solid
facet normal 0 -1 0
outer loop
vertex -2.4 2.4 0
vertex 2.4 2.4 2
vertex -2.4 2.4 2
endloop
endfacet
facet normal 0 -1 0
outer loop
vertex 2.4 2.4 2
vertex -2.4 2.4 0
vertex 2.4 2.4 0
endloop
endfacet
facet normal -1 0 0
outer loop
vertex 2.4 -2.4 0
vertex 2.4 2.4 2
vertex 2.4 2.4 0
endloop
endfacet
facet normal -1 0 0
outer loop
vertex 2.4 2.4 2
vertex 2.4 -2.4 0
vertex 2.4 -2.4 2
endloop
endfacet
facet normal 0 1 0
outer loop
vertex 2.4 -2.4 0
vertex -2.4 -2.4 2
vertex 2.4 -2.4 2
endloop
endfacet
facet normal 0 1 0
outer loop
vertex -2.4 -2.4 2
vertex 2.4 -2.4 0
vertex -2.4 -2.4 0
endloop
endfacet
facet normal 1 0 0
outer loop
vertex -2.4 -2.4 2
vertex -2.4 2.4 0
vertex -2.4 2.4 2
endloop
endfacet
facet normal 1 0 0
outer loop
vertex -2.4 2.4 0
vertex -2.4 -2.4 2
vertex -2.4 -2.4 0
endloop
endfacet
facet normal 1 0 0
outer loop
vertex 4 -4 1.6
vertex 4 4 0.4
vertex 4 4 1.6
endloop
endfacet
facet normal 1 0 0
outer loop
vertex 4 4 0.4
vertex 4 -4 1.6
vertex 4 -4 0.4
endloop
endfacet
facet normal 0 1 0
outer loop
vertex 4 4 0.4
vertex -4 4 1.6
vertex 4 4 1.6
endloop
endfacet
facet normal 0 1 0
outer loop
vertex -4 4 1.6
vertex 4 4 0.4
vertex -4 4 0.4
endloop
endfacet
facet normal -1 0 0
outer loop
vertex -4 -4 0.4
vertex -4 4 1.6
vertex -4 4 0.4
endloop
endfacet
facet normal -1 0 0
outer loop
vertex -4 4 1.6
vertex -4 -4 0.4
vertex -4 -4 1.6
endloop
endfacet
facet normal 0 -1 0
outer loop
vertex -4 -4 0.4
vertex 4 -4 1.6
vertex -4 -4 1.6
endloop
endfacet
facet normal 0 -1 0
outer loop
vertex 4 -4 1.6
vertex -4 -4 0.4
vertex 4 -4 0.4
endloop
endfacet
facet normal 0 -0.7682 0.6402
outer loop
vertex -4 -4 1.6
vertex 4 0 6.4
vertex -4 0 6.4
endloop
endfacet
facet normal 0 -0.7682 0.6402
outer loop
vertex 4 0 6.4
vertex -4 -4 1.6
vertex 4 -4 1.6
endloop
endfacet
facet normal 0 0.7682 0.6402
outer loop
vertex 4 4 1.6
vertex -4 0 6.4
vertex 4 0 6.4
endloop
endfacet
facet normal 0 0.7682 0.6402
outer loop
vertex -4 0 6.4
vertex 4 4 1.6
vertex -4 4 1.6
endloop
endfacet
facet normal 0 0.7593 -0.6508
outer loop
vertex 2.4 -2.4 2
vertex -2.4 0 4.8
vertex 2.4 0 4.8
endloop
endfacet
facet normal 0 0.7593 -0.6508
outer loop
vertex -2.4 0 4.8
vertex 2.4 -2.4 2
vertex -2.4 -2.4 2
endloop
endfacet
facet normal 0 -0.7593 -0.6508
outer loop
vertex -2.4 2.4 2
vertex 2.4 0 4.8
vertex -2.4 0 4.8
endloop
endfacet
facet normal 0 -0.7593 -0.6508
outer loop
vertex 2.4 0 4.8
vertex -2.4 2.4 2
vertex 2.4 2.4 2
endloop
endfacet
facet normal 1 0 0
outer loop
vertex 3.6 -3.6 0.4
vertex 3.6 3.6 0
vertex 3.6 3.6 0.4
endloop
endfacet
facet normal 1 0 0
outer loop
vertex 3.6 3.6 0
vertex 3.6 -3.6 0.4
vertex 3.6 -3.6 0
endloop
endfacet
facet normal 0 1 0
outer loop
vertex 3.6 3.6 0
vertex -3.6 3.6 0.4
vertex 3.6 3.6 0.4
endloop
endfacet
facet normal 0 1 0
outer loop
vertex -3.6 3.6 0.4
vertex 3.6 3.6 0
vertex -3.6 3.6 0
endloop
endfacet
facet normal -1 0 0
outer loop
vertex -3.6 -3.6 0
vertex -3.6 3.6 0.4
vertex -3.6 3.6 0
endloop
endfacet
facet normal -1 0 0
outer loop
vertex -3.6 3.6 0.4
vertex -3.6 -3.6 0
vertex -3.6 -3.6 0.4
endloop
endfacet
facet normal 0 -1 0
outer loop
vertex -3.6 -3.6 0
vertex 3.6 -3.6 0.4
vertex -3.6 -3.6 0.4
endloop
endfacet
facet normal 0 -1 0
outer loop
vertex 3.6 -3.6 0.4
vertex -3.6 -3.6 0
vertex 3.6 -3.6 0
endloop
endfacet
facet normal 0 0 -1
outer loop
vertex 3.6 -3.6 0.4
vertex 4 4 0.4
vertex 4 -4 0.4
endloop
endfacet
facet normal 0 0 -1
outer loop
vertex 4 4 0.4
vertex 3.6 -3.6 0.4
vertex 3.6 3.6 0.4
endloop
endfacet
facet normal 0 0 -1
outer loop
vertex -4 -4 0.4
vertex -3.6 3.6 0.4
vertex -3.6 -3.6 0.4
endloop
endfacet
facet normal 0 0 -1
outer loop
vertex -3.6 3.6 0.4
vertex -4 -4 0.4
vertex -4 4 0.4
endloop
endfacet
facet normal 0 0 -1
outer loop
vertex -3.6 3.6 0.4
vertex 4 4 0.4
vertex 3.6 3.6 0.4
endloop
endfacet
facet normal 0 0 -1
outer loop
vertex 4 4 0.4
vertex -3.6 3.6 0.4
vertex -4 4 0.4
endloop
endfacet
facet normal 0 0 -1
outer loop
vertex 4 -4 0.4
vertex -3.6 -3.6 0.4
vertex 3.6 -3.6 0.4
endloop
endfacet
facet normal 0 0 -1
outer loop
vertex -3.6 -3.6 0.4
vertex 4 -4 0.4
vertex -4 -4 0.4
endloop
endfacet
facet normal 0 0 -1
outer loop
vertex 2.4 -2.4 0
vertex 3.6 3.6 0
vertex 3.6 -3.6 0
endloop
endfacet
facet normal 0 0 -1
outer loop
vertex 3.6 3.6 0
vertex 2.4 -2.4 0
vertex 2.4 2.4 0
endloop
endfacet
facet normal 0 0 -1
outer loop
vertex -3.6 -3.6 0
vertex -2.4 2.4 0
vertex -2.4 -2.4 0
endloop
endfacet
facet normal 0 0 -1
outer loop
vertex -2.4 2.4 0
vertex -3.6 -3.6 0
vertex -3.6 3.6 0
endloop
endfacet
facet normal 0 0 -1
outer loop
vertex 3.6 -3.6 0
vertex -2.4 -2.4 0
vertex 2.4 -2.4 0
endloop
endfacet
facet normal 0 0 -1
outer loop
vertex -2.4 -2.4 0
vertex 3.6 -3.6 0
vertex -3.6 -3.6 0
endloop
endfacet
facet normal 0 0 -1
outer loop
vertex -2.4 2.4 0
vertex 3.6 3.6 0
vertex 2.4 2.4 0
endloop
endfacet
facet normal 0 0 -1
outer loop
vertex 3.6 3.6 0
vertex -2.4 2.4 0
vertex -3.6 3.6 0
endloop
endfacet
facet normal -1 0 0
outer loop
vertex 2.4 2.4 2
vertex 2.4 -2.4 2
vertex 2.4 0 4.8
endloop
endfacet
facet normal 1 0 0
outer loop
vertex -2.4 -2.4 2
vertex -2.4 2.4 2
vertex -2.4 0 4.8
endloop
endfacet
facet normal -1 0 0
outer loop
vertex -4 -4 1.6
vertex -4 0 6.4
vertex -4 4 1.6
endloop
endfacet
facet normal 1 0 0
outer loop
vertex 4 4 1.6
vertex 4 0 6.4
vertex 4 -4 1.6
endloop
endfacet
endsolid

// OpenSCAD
// file: ../p/stud23d.scad
use <../lib.scad>
use <box4o4a.scad>
function ldraw_lib__stud23d() = [
// 0 Stud Tube Open Square without Bottom Face and Edges
// 0 Name: stud23d.dat
// 0 Author: Steffen [Steffen]
// 0 !LDRAW_ORG Primitive UPDATE 2018-02
// 0 !LICENSE Licensed under CC BY 4.0 : see CAreadme.txt
// 
// 0 BFC CERTIFY CCW
  [0,"BFC","CERTIFY"],
  [0,"BFC","CCW"],
// 
// 0 !HISTORY 2018-12-08 [PTadmin] Official Update 2018-02
// 
// 
// 0 BFC INVERTNEXT
  [0,"BFC","INVERTNEXT"],
// 1 16 0 0 0 6 0 0 0 4 0 0 0 6 box4o4a.dat
  [1,16,0,0,0,6,0,0,0,4,0,0,0,6, ldraw_lib__box4o4a()],
];
module ldraw_lib__stud23d(step=0, col=false, unit=2/5, alt=false, line=0.2, solid=!$preview)
    makepoly(ldraw_lib__stud23d(), step=step, col=col, unit=unit, alt=alt, line=line, solid=solid);
ldraw_lib__stud23d(line=0.2);
// file: ../p/box4o4a.scad
use <../lib.scad>
function ldraw_lib__box4o4a() = [
// 0 Box with 4 Faces (2 Parallel Pairs) without Bottom Edges
// 0 Name: box4o4a.dat
// 0 Author: Donald Sutter [technog]
// 0 !LDRAW_ORG Primitive UPDATE 2012-01
// 0 !LICENSE Licensed under CC BY 4.0 : see CAreadme.txt
// 
// 0 BFC CERTIFY CCW
  [0,"BFC","CERTIFY"],
  [0,"BFC","CCW"],
// 
// 0 !HISTORY 2003-08-01 [PTadmin] Official Update 2003-02
// 0 !HISTORY 2007-06-24 [PTadmin] Header formatted for Contributor Agreement
// 0 !HISTORY 2008-07-01 [PTadmin] Official Update 2008-01
// 0 !HISTORY 2012-02-16 [Philo] Changed to CCW
// 0 !HISTORY 2012-03-30 [PTadmin] Official Update 2012-01
// 
// 
// 2 24 1 0 1 -1 0 1
  [2,24,1,0,1,-1,0,1],
// 2 24 -1 0 1 -1 0 -1
  [2,24,-1,0,1,-1,0,-1],
// 2 24 -1 0 -1 1 0 -1
  [2,24,-1,0,-1,1,0,-1],
// 2 24 1 0 -1 1 0 1
  [2,24,1,0,-1,1,0,1],
// 2 24 1 0 1 1 1 1
  [2,24,1,0,1,1,1,1],
// 2 24 -1 0 1 -1 1 1
  [2,24,-1,0,1,-1,1,1],
// 2 24 1 0 -1 1 1 -1
  [2,24,1,0,-1,1,1,-1],
// 2 24 -1 0 -1 -1 1 -1
  [2,24,-1,0,-1,-1,1,-1],
// 4 16 -1 1 1 -1 0 1 1 0 1 1 1 1
  [4,16,-1,1,1,-1,0,1,1,0,1,1,1,1],
// 4 16 -1 1 -1 -1 0 -1 -1 0 1 -1 1 1
  [4,16,-1,1,-1,-1,0,-1,-1,0,1,-1,1,1],
// 4 16 1 1 -1 1 0 -1 -1 0 -1 -1 1 -1
  [4,16,1,1,-1,1,0,-1,-1,0,-1,-1,1,-1],
// 4 16 1 1 1 1 0 1 1 0 -1 1 1 -1
  [4,16,1,1,1,1,0,1,1,0,-1,1,1,-1],
];
module ldraw_lib__box4o4a(step=0, col=false, unit=2/5, alt=false, line=0.2, solid=!$preview)
    makepoly(ldraw_lib__box4o4a(), step=step, col=col, unit=unit, alt=alt, line=line, solid=solid);
ldraw_lib__box4o4a(line=0.2);
// file: ../p/box4.scad
use <../lib.scad>
function ldraw_lib__box4() = [
// 0 Box with 4 Faces (2 Parallel Pairs) and All Edges
// 0 Name: box4.dat
// 0 Author: James Jessiman
// 0 !LDRAW_ORG Primitive UPDATE 2012-01
// 0 !LICENSE Licensed under CC BY 4.0 : see CAreadme.txt
// 
// 0 BFC CERTIFY CCW
  [0,"BFC","CERTIFY"],
  [0,"BFC","CCW"],
// 
// 0 !HISTORY 2002-04-03 [sbliss] Modified for BFC compliance
// 0 !HISTORY 2002-04-25 [PTadmin] Official Update 2002-02
// 0 !HISTORY 2007-06-24 [PTadmin] Header formatted for Contributor Agreement
// 0 !HISTORY 2008-07-01 [PTadmin] Official Update 2008-01
// 0 !HISTORY 2012-02-16 [Philo] Changed to CCW
// 0 !HISTORY 2012-03-30 [PTadmin] Official Update 2012-01
// 
// 
// 2 24 1 1 1 -1 1 1
  [2,24,1,1,1,-1,1,1],
// 2 24 -1 1 1 -1 1 -1
  [2,24,-1,1,1,-1,1,-1],
// 2 24 -1 1 -1 1 1 -1
  [2,24,-1,1,-1,1,1,-1],
// 2 24 1 1 -1 1 1 1
  [2,24,1,1,-1,1,1,1],
// 2 24 1 0 1 -1 0 1
  [2,24,1,0,1,-1,0,1],
// 2 24 -1 0 1 -1 0 -1
  [2,24,-1,0,1,-1,0,-1],
// 2 24 -1 0 -1 1 0 -1
  [2,24,-1,0,-1,1,0,-1],
// 2 24 1 0 -1 1 0 1
  [2,24,1,0,-1,1,0,1],
// 2 24 1 0 1 1 1 1
  [2,24,1,0,1,1,1,1],
// 2 24 -1 0 1 -1 1 1
  [2,24,-1,0,1,-1,1,1],
// 2 24 1 0 -1 1 1 -1
  [2,24,1,0,-1,1,1,-1],
// 2 24 -1 0 -1 -1 1 -1
  [2,24,-1,0,-1,-1,1,-1],
// 4 16 -1 1 1 -1 0 1 1 0 1 1 1 1
  [4,16,-1,1,1,-1,0,1,1,0,1,1,1,1],
// 4 16 -1 1 -1 -1 0 -1 -1 0 1 -1 1 1
  [4,16,-1,1,-1,-1,0,-1,-1,0,1,-1,1,1],
// 4 16 1 1 -1 1 0 -1 -1 0 -1 -1 1 -1
  [4,16,1,1,-1,1,0,-1,-1,0,-1,-1,1,-1],
// 4 16 1 1 1 1 0 1 1 0 -1 1 1 -1
  [4,16,1,1,1,1,0,1,1,0,-1,1,1,-1],
];
module ldraw_lib__box4(step=0, col=false, unit=2/5, alt=false, line=0.2, solid=!$preview)
    makepoly(ldraw_lib__box4(), step=step, col=col, unit=unit, alt=alt, line=line, solid=solid);
ldraw_lib__box4(line=0.2);
// file: ../p/box2-5.scad
use <../lib.scad>
function ldraw_lib__box2_5() = [
// 0 Box with 2 Faces without 5 Edges
// 0 Name: box2-5.dat
// 0 Author: Steffen [Steffen]
// 0 !LDRAW_ORG Primitive UPDATE 2003-03
// 0 !LICENSE Licensed under CC BY 4.0 : see CAreadme.txt
// 
// 0 BFC CERTIFY CCW
  [0,"BFC","CERTIFY"],
  [0,"BFC","CCW"],
// 
// 0 !HISTORY 2003-12-19 [PTadmin] Official Update 2003-03
// 0 !HISTORY 2007-06-24 [PTadmin] Header formatted for Contributor Agreement
// 0 !HISTORY 2008-07-01 [PTadmin] Official Update 2008-01
// 
// 
// 2 24 1 1 1 -1 1 1
  [2,24,1,1,1,-1,1,1],
// 2 24 1 1 -1 -1 1 -1
  [2,24,1,1,-1,-1,1,-1],
// 2 24 1 -1 1 -1 -1 1
  [2,24,1,-1,1,-1,-1,1],
// 2 24 -1 -1 1 -1 1 1
  [2,24,-1,-1,1,-1,1,1],
// 2 24 1 -1 1 1 1 1
  [2,24,1,-1,1,1,1,1],
// 2 24 -1 1 -1 -1 1 1
  [2,24,-1,1,-1,-1,1,1],
// 2 24 1 1 -1 1 1 1
  [2,24,1,1,-1,1,1,1],
// 4 16 1 1 1 1 1 -1 -1 1 -1 -1 1 1
  [4,16,1,1,1,1,1,-1,-1,1,-1,-1,1,1],
// 4 16 1 1 1 -1 1 1 -1 -1 1 1 -1 1
  [4,16,1,1,1,-1,1,1,-1,-1,1,1,-1,1],
// 0
];
module ldraw_lib__box2_5(step=0, col=false, unit=2/5, alt=false, line=0.2, solid=!$preview)
    makepoly(ldraw_lib__box2_5(), step=step, col=col, unit=unit, alt=alt, line=line, solid=solid);
ldraw_lib__box2_5(line=0.2);
// main file
use <../lib.scad>
use <../p/box2-5.scad>
use <../p/box4.scad>
use <../p/box4o4a.scad>
use <../p/stud23d.scad>
function ldraw_lib__35464() = [
// 0 Slope Brick 45  1 x  1 Double
// 0 Name: 35464.dat
// 0 Author: Philippe Hurbain [Philo]
// 0 !LDRAW_ORG Part UPDATE 2018-02
// 0 !LICENSE Licensed under CC BY 4.0 : see CAreadme.txt
// 
// 0 BFC CERTIFY CCW
  [0,"BFC","CERTIFY"],
  [0,"BFC","CCW"],
// 
// 0 !KEYWORDS Ridge, Roof
// 
// 0 !HISTORY 2018-12-08 [PTadmin] Official Update 2018-02
// 
// 
// 1 16 0 0 0 -1 0 0 0 -1.25 0 0 0 1 stud23d.dat
  [1,16,0,0,0,-1,0,0,0,-1.25,0,0,0,1, ldraw_lib__stud23d()],
// 1 16 0 -1 0 0 0 10 0 -3 0 -10 0 0 box4o4a.dat
  [1,16,0,-1,0,0,0,10,0,-3,0,-10,0,0, ldraw_lib__box4o4a()],
// 1 16 0 -4 0 -10 0 0 0 -6 -6 0 -5 5 box2-5.dat
  [1,16,0,-4,0,-10,0,0,0,-6,-6,0,-5,5, ldraw_lib__box2_5()],
// 0 BFC INVERTNEXT
  [0,"BFC","INVERTNEXT"],
// 1 16 0 -5 0 -6 0 0 0 -3.5 -3.5 0 -3 3 box2-5.dat
  [1,16,0,-5,0,-6,0,0,0,-3.5,-3.5,0,-3,3, ldraw_lib__box2_5()],
// 1 16 0 -1 0 0 0 9 0 1 0 -9 0 0 box4.dat
  [1,16,0,-1,0,0,0,9,0,1,0,-9,0,0, ldraw_lib__box4()],
// 4 16 10 -1 -10 9 -1 -9 9 -1 9 10 -1 10
  [4,16,10,-1,-10,9,-1,-9,9,-1,9,10,-1,10],
// 4 16 -10 -1 10 -9 -1 9 -9 -1 -9 -10 -1 -10
  [4,16,-10,-1,10,-9,-1,9,-9,-1,-9,-10,-1,-10],
// 4 16 10 -1 10 9 -1 9 -9 -1 9 -10 -1 10
  [4,16,10,-1,10,9,-1,9,-9,-1,9,-10,-1,10],
// 4 16 -10 -1 -10 -9 -1 -9 9 -1 -9 10 -1 -10
  [4,16,-10,-1,-10,-9,-1,-9,9,-1,-9,10,-1,-10],
// 4 16 6 0 -6 6 0 6 9 0 9 9 0 -9
  [4,16,6,0,-6,6,0,6,9,0,9,9,0,-9],
// 4 16 -6 0 6 -6 0 -6 -9 0 -9 -9 0 9
  [4,16,-6,0,6,-6,0,-6,-9,0,-9,-9,0,9],
// 4 16 -6 0 -6 6 0 -6 9 0 -9 -9 0 -9
  [4,16,-6,0,-6,6,0,-6,9,0,-9,-9,0,-9],
// 4 16 6 0 6 -6 0 6 -9 0 9 9 0 9
  [4,16,6,0,6,-6,0,6,-9,0,9,9,0,9],
// 3 16 6 -5 6 6 -5 -6 6 -12 0
  [3,16,6,-5,6,6,-5,-6,6,-12,0],
// 3 16 -6 -5 -6 -6 -5 6 -6 -12 0
  [3,16,-6,-5,-6,-6,-5,6,-6,-12,0],
// 3 16 -10 -4 -10 -10 -16 0 -10 -4 10
  [3,16,-10,-4,-10,-10,-16,0,-10,-4,10],
// 3 16 10 -4 10 10 -16 0 10 -4 -10
  [3,16,10,-4,10,10,-16,0,10,-4,-10],
];
module ldraw_lib__35464(step=0, col=false, unit=2/5, alt=false, line=0.2, solid=!$preview)
    makepoly(ldraw_lib__35464(), step=step, col=col, unit=unit, alt=alt, line=line, solid=solid);
ldraw_lib__35464(line=0.2);
